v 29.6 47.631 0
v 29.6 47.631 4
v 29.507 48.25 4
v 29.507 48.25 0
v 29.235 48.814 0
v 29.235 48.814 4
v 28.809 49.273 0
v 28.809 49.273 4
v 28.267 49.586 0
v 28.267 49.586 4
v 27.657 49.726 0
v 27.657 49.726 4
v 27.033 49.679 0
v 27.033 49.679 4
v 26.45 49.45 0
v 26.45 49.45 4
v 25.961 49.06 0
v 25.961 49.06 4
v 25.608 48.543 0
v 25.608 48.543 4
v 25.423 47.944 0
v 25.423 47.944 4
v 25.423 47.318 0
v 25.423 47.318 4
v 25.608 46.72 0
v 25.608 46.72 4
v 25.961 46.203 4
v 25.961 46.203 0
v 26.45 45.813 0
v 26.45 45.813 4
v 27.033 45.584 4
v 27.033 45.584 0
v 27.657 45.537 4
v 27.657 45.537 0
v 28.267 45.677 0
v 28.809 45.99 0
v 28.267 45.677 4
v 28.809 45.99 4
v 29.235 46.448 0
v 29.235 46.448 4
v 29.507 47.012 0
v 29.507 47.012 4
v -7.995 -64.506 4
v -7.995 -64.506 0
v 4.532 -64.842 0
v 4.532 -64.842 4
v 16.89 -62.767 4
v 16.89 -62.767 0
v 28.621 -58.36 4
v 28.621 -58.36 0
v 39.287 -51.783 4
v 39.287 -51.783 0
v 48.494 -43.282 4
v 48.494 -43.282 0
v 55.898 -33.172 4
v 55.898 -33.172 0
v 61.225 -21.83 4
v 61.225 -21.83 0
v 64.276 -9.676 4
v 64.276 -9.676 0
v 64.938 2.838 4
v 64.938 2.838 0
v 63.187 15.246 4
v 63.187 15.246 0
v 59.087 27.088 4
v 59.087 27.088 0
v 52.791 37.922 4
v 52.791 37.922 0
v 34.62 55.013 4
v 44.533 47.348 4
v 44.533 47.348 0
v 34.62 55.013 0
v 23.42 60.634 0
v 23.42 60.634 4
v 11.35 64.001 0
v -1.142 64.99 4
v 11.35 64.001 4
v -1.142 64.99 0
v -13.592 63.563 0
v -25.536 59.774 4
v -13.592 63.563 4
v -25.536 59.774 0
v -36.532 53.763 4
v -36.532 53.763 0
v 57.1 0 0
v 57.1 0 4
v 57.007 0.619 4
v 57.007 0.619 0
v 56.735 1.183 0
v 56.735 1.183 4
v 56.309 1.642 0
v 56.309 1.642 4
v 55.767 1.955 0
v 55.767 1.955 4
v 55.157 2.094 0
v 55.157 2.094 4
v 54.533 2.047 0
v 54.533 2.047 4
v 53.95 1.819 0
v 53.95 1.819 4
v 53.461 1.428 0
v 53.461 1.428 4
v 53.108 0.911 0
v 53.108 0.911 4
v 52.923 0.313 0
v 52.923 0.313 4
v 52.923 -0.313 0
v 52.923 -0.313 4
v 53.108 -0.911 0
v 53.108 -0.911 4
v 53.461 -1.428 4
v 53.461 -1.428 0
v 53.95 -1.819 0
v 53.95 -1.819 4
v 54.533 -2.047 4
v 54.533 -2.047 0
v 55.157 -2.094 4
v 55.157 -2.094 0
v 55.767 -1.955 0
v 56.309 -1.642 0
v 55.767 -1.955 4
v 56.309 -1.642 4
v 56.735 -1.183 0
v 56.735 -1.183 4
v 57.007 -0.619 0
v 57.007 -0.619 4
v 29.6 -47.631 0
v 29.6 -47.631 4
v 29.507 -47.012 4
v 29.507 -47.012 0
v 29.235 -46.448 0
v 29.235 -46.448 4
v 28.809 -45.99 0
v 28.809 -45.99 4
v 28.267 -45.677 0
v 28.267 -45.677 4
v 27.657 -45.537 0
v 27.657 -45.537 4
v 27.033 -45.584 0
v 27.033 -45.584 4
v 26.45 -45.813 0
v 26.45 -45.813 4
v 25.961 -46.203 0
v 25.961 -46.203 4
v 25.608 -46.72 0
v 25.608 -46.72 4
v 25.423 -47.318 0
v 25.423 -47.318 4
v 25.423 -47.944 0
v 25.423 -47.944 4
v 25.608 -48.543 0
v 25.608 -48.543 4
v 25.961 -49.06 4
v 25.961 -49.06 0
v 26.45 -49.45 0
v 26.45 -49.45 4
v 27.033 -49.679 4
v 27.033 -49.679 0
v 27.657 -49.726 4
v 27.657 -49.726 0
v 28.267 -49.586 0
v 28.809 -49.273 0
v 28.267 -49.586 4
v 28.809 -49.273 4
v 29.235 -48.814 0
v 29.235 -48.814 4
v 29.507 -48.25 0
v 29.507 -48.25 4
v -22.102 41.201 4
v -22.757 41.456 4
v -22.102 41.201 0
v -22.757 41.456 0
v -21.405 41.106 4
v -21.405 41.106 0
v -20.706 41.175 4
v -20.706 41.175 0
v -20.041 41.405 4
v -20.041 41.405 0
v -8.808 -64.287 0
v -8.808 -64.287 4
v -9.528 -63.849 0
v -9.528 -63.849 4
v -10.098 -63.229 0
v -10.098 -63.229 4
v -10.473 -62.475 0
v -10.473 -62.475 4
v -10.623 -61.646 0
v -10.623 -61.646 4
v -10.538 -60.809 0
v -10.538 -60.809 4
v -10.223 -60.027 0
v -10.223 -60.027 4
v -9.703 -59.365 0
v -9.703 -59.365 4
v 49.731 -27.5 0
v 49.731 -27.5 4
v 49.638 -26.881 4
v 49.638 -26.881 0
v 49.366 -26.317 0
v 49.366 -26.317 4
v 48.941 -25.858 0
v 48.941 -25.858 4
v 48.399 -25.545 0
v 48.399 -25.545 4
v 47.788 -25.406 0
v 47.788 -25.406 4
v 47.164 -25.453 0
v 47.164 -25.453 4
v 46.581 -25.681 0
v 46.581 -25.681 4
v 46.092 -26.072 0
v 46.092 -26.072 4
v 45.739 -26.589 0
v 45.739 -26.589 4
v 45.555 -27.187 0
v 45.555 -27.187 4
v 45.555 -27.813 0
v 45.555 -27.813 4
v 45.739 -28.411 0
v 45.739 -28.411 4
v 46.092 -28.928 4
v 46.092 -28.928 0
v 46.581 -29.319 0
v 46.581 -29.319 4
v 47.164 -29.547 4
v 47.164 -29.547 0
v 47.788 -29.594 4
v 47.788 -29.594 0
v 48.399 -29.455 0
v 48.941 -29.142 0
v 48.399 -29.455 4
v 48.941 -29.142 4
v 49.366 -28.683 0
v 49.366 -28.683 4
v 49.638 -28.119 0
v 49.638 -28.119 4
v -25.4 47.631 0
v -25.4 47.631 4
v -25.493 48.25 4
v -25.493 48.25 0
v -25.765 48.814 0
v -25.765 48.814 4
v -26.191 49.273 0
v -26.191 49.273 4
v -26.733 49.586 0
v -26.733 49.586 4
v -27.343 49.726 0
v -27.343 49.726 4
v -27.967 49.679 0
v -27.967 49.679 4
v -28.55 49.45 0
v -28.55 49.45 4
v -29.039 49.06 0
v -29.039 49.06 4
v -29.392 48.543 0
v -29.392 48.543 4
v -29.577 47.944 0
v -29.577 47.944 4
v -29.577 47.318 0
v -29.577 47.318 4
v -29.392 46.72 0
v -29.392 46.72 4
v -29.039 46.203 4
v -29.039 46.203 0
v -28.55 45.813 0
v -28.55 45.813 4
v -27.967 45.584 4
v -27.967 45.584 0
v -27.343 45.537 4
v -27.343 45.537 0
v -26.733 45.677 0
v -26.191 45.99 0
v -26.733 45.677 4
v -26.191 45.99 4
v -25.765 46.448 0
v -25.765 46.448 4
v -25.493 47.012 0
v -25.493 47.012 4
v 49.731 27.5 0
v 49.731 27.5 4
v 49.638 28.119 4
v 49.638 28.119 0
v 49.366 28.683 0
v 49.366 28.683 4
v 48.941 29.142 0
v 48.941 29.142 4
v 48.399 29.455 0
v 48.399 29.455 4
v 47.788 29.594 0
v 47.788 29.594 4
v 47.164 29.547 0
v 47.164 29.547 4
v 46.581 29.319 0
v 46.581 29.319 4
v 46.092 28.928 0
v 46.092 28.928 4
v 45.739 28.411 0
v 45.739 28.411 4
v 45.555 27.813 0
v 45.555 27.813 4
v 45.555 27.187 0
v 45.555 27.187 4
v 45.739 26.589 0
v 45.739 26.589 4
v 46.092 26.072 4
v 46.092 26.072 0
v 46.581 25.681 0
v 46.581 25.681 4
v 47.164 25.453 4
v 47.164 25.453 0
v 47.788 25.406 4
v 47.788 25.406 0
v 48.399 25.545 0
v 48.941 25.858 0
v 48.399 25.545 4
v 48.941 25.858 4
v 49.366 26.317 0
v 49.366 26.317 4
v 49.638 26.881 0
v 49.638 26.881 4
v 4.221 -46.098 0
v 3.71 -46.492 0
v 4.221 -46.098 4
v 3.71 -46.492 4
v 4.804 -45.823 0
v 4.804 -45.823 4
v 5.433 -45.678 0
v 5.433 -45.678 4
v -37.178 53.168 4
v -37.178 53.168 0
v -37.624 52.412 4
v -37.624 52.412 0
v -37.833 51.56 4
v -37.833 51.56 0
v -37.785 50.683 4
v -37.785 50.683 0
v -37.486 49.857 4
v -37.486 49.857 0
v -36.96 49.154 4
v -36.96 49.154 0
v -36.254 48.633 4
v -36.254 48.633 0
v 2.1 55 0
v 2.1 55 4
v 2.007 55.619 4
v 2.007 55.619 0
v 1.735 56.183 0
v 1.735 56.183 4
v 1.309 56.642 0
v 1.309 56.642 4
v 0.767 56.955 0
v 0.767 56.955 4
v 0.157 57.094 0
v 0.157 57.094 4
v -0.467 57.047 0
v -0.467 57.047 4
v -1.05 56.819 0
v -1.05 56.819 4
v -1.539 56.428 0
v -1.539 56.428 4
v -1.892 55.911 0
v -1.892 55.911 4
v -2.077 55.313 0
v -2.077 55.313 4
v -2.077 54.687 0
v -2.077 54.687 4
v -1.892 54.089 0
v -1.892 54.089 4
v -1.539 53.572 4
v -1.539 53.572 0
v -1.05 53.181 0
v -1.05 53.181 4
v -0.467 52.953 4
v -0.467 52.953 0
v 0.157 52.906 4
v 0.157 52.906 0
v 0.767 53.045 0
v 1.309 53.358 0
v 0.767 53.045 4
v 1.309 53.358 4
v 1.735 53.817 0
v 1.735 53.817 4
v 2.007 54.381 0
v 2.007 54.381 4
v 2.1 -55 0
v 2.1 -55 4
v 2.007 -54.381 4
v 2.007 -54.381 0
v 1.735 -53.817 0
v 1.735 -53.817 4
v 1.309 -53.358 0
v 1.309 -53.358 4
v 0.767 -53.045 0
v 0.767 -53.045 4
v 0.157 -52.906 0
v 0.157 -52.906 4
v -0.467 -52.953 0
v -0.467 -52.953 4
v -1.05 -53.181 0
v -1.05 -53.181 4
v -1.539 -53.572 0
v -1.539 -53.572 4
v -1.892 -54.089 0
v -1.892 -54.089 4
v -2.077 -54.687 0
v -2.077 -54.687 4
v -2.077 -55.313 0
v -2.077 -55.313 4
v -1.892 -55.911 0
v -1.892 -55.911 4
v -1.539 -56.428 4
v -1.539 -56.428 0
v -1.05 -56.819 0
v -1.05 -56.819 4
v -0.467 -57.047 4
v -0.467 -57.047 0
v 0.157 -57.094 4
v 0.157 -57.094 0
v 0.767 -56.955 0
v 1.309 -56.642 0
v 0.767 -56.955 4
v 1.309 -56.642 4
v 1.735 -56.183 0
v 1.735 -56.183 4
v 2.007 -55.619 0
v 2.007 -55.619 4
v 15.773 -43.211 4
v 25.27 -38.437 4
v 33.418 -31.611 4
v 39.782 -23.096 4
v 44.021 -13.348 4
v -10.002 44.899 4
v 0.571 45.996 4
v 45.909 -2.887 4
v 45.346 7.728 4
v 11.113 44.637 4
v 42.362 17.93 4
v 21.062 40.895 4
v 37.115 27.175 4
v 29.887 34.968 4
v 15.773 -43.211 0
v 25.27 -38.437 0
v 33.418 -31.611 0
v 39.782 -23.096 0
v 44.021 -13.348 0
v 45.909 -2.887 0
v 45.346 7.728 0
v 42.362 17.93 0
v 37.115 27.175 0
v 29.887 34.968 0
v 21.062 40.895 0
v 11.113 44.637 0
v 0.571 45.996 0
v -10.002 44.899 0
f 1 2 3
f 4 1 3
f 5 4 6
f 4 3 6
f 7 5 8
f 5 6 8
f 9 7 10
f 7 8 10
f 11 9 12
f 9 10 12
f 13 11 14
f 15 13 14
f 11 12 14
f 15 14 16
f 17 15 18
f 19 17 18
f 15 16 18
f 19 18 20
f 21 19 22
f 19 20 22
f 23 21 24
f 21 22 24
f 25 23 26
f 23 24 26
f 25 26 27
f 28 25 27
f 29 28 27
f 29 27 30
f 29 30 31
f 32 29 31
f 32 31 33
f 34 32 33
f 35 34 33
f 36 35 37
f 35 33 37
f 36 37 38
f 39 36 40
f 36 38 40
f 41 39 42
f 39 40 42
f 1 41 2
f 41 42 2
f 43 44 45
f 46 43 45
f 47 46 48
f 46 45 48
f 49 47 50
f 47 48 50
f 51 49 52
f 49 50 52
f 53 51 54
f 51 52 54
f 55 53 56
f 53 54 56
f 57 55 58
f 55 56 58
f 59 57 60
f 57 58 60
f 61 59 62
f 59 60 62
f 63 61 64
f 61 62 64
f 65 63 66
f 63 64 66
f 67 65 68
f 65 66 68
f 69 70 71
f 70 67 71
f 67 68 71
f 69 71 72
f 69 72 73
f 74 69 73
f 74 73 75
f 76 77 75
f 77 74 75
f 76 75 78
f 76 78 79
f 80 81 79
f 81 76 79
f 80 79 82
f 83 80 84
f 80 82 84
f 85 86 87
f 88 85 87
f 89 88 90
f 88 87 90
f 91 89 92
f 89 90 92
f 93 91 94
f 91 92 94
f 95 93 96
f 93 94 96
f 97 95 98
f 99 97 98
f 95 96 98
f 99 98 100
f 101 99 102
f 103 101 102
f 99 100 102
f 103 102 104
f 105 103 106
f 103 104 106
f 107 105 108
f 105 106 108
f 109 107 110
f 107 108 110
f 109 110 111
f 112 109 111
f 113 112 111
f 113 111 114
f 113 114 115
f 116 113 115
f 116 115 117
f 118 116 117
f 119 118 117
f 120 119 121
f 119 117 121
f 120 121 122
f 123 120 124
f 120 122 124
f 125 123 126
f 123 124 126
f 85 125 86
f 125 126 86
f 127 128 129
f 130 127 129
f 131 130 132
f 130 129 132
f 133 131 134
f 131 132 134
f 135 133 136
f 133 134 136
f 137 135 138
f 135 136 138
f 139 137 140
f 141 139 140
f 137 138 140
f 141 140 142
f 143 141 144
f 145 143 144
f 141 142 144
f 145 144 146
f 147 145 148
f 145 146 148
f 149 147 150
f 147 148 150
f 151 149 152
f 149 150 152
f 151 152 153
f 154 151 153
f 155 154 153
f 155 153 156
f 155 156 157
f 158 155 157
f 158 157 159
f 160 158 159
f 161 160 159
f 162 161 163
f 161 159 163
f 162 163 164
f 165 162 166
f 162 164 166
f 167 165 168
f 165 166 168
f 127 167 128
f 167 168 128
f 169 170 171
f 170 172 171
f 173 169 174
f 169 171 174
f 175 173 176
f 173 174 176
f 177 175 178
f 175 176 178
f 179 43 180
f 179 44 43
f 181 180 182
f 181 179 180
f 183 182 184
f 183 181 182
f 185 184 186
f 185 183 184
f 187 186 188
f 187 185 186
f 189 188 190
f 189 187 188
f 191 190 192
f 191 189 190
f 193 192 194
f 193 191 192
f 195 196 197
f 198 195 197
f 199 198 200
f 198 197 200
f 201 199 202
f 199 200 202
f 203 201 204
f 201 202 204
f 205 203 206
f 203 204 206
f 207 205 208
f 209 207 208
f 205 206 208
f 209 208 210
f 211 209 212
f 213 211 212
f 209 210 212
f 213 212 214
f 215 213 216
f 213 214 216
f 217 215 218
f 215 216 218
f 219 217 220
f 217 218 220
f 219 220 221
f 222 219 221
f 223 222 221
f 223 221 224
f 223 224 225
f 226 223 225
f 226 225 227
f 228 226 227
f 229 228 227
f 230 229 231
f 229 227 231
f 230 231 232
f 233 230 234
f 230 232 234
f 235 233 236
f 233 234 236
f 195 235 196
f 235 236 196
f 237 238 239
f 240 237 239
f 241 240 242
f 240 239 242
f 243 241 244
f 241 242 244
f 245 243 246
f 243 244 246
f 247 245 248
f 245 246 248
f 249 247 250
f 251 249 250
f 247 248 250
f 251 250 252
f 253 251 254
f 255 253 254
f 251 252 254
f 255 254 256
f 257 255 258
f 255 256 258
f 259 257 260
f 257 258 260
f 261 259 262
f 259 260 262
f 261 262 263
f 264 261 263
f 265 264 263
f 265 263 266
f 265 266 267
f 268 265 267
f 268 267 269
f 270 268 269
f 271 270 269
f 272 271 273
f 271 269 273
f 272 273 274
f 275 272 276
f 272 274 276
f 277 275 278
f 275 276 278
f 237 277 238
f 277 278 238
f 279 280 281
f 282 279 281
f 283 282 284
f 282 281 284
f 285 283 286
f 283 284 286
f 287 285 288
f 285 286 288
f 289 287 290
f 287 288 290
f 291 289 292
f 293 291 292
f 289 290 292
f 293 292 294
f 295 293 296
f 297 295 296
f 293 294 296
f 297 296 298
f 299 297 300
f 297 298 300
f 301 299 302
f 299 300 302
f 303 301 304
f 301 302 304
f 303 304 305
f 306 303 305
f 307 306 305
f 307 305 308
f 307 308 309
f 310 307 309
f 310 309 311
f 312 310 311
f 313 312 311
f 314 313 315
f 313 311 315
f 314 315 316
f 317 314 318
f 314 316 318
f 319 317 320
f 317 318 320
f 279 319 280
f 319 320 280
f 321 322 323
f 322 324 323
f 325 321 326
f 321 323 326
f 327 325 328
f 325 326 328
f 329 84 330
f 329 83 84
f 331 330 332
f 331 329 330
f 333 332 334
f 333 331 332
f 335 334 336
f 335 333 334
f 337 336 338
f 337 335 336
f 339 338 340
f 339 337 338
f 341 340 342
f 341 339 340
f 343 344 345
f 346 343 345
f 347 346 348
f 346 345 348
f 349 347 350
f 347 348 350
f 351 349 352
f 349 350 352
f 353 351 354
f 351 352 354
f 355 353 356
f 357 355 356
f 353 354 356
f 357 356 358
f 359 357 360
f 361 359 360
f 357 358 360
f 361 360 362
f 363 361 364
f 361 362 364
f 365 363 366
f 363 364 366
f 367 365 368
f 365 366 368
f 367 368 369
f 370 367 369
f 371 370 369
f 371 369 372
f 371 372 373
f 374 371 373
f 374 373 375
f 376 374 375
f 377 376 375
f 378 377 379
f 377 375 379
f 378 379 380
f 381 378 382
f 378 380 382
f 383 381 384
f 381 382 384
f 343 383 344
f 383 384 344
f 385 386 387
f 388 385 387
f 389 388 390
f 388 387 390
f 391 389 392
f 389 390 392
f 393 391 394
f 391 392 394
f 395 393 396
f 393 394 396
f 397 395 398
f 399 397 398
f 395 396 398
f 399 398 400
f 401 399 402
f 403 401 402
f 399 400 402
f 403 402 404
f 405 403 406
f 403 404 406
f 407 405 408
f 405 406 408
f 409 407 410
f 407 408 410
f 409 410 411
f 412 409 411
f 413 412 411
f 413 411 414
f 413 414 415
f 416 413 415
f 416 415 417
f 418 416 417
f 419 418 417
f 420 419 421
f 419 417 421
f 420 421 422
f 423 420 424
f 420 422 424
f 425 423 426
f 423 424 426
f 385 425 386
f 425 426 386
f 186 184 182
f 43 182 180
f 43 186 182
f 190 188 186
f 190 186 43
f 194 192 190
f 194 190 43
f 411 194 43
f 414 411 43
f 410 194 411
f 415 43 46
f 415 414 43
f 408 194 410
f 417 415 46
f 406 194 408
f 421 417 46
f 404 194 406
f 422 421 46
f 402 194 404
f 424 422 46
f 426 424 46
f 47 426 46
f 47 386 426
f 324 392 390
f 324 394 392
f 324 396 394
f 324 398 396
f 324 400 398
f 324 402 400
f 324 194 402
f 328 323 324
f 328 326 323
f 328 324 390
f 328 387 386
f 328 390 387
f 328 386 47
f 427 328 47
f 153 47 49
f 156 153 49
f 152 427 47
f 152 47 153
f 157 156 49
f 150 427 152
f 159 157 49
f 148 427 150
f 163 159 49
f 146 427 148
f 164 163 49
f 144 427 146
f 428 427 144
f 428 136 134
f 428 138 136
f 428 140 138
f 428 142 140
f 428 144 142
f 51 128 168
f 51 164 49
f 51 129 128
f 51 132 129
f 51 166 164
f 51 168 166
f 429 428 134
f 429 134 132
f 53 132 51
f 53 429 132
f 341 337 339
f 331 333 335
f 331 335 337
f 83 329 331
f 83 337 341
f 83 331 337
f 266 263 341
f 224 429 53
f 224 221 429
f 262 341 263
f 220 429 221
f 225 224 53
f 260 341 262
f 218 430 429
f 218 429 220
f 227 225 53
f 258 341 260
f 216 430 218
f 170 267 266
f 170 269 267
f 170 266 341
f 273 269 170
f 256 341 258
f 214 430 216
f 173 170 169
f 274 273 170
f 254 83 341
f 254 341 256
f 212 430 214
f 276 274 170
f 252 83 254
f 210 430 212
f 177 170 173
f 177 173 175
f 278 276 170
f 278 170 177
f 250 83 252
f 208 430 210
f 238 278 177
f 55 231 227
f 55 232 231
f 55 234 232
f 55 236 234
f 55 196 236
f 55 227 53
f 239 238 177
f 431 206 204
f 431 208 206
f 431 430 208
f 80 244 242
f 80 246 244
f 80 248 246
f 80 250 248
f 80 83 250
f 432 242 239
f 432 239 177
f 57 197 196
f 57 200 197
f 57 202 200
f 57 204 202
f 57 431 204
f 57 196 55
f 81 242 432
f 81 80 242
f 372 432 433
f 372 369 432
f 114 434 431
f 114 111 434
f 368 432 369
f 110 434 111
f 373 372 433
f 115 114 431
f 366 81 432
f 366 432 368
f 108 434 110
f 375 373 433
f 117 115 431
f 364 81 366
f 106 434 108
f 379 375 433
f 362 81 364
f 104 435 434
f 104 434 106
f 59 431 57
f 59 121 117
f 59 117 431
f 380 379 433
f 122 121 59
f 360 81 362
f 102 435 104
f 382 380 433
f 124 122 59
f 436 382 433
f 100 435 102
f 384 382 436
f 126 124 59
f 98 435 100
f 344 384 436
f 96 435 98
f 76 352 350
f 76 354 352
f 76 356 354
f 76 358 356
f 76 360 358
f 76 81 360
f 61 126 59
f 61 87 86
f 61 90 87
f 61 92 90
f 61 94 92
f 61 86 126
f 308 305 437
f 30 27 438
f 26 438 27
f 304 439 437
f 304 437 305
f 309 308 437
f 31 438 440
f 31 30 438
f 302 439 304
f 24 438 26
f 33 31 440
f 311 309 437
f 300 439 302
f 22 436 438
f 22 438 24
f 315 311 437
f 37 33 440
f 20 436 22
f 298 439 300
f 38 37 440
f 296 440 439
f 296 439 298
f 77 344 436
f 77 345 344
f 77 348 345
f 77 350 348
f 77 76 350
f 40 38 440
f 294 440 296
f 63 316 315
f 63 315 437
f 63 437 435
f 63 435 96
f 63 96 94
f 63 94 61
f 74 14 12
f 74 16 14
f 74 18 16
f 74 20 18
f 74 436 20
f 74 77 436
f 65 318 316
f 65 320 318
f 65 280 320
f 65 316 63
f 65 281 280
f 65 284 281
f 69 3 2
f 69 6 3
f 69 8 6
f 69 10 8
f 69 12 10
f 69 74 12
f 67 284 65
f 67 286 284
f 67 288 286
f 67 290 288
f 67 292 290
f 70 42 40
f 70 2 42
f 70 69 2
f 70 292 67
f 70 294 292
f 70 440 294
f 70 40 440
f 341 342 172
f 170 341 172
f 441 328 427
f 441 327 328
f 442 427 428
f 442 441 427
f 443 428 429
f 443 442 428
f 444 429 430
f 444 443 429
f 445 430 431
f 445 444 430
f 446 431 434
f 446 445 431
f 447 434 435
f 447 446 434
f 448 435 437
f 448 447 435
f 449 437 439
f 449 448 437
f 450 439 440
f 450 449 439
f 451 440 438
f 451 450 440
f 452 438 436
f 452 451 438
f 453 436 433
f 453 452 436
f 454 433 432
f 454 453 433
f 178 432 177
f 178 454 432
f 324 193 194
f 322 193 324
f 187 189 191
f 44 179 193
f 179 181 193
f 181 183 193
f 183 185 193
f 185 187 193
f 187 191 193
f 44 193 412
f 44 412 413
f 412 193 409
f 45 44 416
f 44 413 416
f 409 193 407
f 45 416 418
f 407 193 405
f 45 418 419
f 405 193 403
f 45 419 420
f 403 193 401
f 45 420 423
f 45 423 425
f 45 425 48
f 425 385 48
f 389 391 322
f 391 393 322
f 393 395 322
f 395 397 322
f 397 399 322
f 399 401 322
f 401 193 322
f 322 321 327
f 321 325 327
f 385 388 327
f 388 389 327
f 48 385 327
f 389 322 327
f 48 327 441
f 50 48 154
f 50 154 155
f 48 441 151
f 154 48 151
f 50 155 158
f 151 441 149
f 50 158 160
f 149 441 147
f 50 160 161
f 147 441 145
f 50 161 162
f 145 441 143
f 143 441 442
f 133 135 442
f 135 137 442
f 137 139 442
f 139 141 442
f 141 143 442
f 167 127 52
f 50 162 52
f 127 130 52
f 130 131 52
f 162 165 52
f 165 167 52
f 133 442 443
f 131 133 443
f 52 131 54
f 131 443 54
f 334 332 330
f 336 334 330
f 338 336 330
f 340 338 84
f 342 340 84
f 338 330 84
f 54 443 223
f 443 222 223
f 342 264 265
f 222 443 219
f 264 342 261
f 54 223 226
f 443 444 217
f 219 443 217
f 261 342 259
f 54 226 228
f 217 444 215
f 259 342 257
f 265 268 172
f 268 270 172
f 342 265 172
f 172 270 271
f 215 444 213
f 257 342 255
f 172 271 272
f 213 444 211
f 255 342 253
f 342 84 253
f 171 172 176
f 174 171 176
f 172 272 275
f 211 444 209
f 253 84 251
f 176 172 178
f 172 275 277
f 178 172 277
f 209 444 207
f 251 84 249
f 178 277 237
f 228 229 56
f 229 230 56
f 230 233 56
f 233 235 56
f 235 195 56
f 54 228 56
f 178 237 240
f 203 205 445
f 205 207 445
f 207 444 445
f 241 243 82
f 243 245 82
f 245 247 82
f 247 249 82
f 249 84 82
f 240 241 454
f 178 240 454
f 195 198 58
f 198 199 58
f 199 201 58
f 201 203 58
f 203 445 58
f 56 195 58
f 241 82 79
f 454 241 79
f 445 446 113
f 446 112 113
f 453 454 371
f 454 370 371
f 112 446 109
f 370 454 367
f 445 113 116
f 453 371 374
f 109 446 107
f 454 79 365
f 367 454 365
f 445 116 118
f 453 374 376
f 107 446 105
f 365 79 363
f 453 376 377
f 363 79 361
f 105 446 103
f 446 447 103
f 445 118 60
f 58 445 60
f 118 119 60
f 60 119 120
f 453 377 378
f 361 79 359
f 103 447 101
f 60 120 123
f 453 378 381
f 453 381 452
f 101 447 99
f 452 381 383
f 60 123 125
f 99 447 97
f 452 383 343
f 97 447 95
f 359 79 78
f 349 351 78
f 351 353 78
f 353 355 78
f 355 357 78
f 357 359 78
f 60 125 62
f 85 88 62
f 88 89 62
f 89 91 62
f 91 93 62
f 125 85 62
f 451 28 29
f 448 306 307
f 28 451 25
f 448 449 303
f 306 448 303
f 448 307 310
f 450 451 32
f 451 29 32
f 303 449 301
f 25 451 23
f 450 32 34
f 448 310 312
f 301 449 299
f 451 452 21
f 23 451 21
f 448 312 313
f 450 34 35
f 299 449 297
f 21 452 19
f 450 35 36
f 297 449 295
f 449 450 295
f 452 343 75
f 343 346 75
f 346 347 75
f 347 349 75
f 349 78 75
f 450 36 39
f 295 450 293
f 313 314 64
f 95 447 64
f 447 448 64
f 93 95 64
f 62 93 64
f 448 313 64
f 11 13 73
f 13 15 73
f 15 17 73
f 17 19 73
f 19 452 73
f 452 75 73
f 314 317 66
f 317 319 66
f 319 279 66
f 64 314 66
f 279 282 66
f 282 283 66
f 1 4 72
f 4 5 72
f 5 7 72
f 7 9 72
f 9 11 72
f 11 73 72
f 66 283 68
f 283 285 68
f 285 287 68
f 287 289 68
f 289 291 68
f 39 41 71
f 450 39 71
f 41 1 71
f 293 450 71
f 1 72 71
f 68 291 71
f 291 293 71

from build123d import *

# Parameters (mm, degrees)
SKETCH_1_R          = 65
SKETCH_1_R_2        = 46
EXTRUDE_1_DEPTH     = 4
SKETCH_2_R          = 2.1
CUT_EXTRUDE_1_DEPTH = 4
CUT_EXTRUDE_START   = -4
CUT_EXTRUDE_2_DEPTH = 4
FILLET_1_R          = 3
CUT_EXTRUDE_START_2 = -15
CUT_EXTRUDE_3_DEPTH = 15
FILLET_2_R          = 3


with BuildPart() as part:
    # 草图1 → 凸台-拉伸1 (new body)
    with BuildSketch(Plane.XY):
        Circle(SKETCH_1_R)
        Circle(SKETCH_1_R_2, mode=Mode.SUBTRACT)
    extrude(amount=EXTRUDE_1_DEPTH)

    # 草图2 → 切除-拉伸1 (cut)
    with BuildSketch(Plane.XY.offset(4)):
        with Locations((0, 55)):
            Circle(SKETCH_2_R)
        with Locations((27.5, 47.631397208)):
            Circle(SKETCH_2_R)
        with Locations((47.631397208, 27.5)):
            Circle(SKETCH_2_R)
        with Locations((55, 0)):
            Circle(SKETCH_2_R)
        with Locations((47.631397208, -27.5)):
            Circle(SKETCH_2_R)
        with Locations((27.5, -47.631397208)):
            Circle(SKETCH_2_R)
        with Locations((0, -55)):
            Circle(SKETCH_2_R)
        with Locations((-27.5, -47.631397208)):
            Circle(SKETCH_2_R)
        with Locations((-47.631397208, -27.5)):
            Circle(SKETCH_2_R)
        with Locations((-55, 0)):
            Circle(SKETCH_2_R)
        with Locations((-47.631397208, 27.5)):
            Circle(SKETCH_2_R)
        with Locations((-27.5, 47.631397208)):
            Circle(SKETCH_2_R)
    extrude(amount=-CUT_EXTRUDE_1_DEPTH, mode=Mode.SUBTRACT)

    # 草图3 → 切除-拉伸2 (cut)
    with BuildSketch(Plane.XY.offset(4).offset(CUT_EXTRUDE_START)):
        with BuildLine():
            Line((-40.462378993, 50.870383193), (27, 15))
            Line((27, 15), (-21.728491376, -61.260694271))
            ThreePointArc((-21.728491376, -61.260694271), (-64.11139308, -10.711175351), (-40.462378993, 50.870383193))
        make_face()
    extrude(amount=CUT_EXTRUDE_2_DEPTH, mode=Mode.SUBTRACT)

    # 圆角1
    fillet_1_edges = [part.edges().sort_by_distance(p)[0] for p in [
        (-11.107555195, -44.638797224, 2),
        (-21.385147835, 40.726839456, 2),
        (-21.728491376, -61.260694271, 2),
        (-40.462378993, 50.870383193, 2),
    ]]
    fillet(fillet_1_edges, radius=FILLET_1_R)

    # 草图4 → 切除-拉伸3 (cut)
    with BuildSketch(Plane.XY.offset(4).offset(CUT_EXTRUDE_START_2)):
        with BuildLine():
            Line((-37.660954125, -86.195196375), (4.448149198, -45.784429326))
            ThreePointArc((4.448149198, -45.784429326), (-2.360891137, -45.939375192), (-9.118175919, -45.087236197))
            ThreePointArc((-9.118175919, -45.087236197), (-10.884781804, -45.266086971), (-12.24083237, -46.412390079))
            Line((-12.24083237, -46.412390079), (-37.660954125, -86.195196375))
        make_face()
    extrude(amount=CUT_EXTRUDE_3_DEPTH, mode=Mode.SUBTRACT)

    # 圆角2
    fillet_2_edges = [part.edges().sort_by_distance(p)[0] for p in [
        (-13.988029274, -63.477043386, 2),
        (4.448149198, -45.784429326, 2),
    ]]
    fillet(fillet_2_edges, radius=FILLET_2_R)


solid = part.part
